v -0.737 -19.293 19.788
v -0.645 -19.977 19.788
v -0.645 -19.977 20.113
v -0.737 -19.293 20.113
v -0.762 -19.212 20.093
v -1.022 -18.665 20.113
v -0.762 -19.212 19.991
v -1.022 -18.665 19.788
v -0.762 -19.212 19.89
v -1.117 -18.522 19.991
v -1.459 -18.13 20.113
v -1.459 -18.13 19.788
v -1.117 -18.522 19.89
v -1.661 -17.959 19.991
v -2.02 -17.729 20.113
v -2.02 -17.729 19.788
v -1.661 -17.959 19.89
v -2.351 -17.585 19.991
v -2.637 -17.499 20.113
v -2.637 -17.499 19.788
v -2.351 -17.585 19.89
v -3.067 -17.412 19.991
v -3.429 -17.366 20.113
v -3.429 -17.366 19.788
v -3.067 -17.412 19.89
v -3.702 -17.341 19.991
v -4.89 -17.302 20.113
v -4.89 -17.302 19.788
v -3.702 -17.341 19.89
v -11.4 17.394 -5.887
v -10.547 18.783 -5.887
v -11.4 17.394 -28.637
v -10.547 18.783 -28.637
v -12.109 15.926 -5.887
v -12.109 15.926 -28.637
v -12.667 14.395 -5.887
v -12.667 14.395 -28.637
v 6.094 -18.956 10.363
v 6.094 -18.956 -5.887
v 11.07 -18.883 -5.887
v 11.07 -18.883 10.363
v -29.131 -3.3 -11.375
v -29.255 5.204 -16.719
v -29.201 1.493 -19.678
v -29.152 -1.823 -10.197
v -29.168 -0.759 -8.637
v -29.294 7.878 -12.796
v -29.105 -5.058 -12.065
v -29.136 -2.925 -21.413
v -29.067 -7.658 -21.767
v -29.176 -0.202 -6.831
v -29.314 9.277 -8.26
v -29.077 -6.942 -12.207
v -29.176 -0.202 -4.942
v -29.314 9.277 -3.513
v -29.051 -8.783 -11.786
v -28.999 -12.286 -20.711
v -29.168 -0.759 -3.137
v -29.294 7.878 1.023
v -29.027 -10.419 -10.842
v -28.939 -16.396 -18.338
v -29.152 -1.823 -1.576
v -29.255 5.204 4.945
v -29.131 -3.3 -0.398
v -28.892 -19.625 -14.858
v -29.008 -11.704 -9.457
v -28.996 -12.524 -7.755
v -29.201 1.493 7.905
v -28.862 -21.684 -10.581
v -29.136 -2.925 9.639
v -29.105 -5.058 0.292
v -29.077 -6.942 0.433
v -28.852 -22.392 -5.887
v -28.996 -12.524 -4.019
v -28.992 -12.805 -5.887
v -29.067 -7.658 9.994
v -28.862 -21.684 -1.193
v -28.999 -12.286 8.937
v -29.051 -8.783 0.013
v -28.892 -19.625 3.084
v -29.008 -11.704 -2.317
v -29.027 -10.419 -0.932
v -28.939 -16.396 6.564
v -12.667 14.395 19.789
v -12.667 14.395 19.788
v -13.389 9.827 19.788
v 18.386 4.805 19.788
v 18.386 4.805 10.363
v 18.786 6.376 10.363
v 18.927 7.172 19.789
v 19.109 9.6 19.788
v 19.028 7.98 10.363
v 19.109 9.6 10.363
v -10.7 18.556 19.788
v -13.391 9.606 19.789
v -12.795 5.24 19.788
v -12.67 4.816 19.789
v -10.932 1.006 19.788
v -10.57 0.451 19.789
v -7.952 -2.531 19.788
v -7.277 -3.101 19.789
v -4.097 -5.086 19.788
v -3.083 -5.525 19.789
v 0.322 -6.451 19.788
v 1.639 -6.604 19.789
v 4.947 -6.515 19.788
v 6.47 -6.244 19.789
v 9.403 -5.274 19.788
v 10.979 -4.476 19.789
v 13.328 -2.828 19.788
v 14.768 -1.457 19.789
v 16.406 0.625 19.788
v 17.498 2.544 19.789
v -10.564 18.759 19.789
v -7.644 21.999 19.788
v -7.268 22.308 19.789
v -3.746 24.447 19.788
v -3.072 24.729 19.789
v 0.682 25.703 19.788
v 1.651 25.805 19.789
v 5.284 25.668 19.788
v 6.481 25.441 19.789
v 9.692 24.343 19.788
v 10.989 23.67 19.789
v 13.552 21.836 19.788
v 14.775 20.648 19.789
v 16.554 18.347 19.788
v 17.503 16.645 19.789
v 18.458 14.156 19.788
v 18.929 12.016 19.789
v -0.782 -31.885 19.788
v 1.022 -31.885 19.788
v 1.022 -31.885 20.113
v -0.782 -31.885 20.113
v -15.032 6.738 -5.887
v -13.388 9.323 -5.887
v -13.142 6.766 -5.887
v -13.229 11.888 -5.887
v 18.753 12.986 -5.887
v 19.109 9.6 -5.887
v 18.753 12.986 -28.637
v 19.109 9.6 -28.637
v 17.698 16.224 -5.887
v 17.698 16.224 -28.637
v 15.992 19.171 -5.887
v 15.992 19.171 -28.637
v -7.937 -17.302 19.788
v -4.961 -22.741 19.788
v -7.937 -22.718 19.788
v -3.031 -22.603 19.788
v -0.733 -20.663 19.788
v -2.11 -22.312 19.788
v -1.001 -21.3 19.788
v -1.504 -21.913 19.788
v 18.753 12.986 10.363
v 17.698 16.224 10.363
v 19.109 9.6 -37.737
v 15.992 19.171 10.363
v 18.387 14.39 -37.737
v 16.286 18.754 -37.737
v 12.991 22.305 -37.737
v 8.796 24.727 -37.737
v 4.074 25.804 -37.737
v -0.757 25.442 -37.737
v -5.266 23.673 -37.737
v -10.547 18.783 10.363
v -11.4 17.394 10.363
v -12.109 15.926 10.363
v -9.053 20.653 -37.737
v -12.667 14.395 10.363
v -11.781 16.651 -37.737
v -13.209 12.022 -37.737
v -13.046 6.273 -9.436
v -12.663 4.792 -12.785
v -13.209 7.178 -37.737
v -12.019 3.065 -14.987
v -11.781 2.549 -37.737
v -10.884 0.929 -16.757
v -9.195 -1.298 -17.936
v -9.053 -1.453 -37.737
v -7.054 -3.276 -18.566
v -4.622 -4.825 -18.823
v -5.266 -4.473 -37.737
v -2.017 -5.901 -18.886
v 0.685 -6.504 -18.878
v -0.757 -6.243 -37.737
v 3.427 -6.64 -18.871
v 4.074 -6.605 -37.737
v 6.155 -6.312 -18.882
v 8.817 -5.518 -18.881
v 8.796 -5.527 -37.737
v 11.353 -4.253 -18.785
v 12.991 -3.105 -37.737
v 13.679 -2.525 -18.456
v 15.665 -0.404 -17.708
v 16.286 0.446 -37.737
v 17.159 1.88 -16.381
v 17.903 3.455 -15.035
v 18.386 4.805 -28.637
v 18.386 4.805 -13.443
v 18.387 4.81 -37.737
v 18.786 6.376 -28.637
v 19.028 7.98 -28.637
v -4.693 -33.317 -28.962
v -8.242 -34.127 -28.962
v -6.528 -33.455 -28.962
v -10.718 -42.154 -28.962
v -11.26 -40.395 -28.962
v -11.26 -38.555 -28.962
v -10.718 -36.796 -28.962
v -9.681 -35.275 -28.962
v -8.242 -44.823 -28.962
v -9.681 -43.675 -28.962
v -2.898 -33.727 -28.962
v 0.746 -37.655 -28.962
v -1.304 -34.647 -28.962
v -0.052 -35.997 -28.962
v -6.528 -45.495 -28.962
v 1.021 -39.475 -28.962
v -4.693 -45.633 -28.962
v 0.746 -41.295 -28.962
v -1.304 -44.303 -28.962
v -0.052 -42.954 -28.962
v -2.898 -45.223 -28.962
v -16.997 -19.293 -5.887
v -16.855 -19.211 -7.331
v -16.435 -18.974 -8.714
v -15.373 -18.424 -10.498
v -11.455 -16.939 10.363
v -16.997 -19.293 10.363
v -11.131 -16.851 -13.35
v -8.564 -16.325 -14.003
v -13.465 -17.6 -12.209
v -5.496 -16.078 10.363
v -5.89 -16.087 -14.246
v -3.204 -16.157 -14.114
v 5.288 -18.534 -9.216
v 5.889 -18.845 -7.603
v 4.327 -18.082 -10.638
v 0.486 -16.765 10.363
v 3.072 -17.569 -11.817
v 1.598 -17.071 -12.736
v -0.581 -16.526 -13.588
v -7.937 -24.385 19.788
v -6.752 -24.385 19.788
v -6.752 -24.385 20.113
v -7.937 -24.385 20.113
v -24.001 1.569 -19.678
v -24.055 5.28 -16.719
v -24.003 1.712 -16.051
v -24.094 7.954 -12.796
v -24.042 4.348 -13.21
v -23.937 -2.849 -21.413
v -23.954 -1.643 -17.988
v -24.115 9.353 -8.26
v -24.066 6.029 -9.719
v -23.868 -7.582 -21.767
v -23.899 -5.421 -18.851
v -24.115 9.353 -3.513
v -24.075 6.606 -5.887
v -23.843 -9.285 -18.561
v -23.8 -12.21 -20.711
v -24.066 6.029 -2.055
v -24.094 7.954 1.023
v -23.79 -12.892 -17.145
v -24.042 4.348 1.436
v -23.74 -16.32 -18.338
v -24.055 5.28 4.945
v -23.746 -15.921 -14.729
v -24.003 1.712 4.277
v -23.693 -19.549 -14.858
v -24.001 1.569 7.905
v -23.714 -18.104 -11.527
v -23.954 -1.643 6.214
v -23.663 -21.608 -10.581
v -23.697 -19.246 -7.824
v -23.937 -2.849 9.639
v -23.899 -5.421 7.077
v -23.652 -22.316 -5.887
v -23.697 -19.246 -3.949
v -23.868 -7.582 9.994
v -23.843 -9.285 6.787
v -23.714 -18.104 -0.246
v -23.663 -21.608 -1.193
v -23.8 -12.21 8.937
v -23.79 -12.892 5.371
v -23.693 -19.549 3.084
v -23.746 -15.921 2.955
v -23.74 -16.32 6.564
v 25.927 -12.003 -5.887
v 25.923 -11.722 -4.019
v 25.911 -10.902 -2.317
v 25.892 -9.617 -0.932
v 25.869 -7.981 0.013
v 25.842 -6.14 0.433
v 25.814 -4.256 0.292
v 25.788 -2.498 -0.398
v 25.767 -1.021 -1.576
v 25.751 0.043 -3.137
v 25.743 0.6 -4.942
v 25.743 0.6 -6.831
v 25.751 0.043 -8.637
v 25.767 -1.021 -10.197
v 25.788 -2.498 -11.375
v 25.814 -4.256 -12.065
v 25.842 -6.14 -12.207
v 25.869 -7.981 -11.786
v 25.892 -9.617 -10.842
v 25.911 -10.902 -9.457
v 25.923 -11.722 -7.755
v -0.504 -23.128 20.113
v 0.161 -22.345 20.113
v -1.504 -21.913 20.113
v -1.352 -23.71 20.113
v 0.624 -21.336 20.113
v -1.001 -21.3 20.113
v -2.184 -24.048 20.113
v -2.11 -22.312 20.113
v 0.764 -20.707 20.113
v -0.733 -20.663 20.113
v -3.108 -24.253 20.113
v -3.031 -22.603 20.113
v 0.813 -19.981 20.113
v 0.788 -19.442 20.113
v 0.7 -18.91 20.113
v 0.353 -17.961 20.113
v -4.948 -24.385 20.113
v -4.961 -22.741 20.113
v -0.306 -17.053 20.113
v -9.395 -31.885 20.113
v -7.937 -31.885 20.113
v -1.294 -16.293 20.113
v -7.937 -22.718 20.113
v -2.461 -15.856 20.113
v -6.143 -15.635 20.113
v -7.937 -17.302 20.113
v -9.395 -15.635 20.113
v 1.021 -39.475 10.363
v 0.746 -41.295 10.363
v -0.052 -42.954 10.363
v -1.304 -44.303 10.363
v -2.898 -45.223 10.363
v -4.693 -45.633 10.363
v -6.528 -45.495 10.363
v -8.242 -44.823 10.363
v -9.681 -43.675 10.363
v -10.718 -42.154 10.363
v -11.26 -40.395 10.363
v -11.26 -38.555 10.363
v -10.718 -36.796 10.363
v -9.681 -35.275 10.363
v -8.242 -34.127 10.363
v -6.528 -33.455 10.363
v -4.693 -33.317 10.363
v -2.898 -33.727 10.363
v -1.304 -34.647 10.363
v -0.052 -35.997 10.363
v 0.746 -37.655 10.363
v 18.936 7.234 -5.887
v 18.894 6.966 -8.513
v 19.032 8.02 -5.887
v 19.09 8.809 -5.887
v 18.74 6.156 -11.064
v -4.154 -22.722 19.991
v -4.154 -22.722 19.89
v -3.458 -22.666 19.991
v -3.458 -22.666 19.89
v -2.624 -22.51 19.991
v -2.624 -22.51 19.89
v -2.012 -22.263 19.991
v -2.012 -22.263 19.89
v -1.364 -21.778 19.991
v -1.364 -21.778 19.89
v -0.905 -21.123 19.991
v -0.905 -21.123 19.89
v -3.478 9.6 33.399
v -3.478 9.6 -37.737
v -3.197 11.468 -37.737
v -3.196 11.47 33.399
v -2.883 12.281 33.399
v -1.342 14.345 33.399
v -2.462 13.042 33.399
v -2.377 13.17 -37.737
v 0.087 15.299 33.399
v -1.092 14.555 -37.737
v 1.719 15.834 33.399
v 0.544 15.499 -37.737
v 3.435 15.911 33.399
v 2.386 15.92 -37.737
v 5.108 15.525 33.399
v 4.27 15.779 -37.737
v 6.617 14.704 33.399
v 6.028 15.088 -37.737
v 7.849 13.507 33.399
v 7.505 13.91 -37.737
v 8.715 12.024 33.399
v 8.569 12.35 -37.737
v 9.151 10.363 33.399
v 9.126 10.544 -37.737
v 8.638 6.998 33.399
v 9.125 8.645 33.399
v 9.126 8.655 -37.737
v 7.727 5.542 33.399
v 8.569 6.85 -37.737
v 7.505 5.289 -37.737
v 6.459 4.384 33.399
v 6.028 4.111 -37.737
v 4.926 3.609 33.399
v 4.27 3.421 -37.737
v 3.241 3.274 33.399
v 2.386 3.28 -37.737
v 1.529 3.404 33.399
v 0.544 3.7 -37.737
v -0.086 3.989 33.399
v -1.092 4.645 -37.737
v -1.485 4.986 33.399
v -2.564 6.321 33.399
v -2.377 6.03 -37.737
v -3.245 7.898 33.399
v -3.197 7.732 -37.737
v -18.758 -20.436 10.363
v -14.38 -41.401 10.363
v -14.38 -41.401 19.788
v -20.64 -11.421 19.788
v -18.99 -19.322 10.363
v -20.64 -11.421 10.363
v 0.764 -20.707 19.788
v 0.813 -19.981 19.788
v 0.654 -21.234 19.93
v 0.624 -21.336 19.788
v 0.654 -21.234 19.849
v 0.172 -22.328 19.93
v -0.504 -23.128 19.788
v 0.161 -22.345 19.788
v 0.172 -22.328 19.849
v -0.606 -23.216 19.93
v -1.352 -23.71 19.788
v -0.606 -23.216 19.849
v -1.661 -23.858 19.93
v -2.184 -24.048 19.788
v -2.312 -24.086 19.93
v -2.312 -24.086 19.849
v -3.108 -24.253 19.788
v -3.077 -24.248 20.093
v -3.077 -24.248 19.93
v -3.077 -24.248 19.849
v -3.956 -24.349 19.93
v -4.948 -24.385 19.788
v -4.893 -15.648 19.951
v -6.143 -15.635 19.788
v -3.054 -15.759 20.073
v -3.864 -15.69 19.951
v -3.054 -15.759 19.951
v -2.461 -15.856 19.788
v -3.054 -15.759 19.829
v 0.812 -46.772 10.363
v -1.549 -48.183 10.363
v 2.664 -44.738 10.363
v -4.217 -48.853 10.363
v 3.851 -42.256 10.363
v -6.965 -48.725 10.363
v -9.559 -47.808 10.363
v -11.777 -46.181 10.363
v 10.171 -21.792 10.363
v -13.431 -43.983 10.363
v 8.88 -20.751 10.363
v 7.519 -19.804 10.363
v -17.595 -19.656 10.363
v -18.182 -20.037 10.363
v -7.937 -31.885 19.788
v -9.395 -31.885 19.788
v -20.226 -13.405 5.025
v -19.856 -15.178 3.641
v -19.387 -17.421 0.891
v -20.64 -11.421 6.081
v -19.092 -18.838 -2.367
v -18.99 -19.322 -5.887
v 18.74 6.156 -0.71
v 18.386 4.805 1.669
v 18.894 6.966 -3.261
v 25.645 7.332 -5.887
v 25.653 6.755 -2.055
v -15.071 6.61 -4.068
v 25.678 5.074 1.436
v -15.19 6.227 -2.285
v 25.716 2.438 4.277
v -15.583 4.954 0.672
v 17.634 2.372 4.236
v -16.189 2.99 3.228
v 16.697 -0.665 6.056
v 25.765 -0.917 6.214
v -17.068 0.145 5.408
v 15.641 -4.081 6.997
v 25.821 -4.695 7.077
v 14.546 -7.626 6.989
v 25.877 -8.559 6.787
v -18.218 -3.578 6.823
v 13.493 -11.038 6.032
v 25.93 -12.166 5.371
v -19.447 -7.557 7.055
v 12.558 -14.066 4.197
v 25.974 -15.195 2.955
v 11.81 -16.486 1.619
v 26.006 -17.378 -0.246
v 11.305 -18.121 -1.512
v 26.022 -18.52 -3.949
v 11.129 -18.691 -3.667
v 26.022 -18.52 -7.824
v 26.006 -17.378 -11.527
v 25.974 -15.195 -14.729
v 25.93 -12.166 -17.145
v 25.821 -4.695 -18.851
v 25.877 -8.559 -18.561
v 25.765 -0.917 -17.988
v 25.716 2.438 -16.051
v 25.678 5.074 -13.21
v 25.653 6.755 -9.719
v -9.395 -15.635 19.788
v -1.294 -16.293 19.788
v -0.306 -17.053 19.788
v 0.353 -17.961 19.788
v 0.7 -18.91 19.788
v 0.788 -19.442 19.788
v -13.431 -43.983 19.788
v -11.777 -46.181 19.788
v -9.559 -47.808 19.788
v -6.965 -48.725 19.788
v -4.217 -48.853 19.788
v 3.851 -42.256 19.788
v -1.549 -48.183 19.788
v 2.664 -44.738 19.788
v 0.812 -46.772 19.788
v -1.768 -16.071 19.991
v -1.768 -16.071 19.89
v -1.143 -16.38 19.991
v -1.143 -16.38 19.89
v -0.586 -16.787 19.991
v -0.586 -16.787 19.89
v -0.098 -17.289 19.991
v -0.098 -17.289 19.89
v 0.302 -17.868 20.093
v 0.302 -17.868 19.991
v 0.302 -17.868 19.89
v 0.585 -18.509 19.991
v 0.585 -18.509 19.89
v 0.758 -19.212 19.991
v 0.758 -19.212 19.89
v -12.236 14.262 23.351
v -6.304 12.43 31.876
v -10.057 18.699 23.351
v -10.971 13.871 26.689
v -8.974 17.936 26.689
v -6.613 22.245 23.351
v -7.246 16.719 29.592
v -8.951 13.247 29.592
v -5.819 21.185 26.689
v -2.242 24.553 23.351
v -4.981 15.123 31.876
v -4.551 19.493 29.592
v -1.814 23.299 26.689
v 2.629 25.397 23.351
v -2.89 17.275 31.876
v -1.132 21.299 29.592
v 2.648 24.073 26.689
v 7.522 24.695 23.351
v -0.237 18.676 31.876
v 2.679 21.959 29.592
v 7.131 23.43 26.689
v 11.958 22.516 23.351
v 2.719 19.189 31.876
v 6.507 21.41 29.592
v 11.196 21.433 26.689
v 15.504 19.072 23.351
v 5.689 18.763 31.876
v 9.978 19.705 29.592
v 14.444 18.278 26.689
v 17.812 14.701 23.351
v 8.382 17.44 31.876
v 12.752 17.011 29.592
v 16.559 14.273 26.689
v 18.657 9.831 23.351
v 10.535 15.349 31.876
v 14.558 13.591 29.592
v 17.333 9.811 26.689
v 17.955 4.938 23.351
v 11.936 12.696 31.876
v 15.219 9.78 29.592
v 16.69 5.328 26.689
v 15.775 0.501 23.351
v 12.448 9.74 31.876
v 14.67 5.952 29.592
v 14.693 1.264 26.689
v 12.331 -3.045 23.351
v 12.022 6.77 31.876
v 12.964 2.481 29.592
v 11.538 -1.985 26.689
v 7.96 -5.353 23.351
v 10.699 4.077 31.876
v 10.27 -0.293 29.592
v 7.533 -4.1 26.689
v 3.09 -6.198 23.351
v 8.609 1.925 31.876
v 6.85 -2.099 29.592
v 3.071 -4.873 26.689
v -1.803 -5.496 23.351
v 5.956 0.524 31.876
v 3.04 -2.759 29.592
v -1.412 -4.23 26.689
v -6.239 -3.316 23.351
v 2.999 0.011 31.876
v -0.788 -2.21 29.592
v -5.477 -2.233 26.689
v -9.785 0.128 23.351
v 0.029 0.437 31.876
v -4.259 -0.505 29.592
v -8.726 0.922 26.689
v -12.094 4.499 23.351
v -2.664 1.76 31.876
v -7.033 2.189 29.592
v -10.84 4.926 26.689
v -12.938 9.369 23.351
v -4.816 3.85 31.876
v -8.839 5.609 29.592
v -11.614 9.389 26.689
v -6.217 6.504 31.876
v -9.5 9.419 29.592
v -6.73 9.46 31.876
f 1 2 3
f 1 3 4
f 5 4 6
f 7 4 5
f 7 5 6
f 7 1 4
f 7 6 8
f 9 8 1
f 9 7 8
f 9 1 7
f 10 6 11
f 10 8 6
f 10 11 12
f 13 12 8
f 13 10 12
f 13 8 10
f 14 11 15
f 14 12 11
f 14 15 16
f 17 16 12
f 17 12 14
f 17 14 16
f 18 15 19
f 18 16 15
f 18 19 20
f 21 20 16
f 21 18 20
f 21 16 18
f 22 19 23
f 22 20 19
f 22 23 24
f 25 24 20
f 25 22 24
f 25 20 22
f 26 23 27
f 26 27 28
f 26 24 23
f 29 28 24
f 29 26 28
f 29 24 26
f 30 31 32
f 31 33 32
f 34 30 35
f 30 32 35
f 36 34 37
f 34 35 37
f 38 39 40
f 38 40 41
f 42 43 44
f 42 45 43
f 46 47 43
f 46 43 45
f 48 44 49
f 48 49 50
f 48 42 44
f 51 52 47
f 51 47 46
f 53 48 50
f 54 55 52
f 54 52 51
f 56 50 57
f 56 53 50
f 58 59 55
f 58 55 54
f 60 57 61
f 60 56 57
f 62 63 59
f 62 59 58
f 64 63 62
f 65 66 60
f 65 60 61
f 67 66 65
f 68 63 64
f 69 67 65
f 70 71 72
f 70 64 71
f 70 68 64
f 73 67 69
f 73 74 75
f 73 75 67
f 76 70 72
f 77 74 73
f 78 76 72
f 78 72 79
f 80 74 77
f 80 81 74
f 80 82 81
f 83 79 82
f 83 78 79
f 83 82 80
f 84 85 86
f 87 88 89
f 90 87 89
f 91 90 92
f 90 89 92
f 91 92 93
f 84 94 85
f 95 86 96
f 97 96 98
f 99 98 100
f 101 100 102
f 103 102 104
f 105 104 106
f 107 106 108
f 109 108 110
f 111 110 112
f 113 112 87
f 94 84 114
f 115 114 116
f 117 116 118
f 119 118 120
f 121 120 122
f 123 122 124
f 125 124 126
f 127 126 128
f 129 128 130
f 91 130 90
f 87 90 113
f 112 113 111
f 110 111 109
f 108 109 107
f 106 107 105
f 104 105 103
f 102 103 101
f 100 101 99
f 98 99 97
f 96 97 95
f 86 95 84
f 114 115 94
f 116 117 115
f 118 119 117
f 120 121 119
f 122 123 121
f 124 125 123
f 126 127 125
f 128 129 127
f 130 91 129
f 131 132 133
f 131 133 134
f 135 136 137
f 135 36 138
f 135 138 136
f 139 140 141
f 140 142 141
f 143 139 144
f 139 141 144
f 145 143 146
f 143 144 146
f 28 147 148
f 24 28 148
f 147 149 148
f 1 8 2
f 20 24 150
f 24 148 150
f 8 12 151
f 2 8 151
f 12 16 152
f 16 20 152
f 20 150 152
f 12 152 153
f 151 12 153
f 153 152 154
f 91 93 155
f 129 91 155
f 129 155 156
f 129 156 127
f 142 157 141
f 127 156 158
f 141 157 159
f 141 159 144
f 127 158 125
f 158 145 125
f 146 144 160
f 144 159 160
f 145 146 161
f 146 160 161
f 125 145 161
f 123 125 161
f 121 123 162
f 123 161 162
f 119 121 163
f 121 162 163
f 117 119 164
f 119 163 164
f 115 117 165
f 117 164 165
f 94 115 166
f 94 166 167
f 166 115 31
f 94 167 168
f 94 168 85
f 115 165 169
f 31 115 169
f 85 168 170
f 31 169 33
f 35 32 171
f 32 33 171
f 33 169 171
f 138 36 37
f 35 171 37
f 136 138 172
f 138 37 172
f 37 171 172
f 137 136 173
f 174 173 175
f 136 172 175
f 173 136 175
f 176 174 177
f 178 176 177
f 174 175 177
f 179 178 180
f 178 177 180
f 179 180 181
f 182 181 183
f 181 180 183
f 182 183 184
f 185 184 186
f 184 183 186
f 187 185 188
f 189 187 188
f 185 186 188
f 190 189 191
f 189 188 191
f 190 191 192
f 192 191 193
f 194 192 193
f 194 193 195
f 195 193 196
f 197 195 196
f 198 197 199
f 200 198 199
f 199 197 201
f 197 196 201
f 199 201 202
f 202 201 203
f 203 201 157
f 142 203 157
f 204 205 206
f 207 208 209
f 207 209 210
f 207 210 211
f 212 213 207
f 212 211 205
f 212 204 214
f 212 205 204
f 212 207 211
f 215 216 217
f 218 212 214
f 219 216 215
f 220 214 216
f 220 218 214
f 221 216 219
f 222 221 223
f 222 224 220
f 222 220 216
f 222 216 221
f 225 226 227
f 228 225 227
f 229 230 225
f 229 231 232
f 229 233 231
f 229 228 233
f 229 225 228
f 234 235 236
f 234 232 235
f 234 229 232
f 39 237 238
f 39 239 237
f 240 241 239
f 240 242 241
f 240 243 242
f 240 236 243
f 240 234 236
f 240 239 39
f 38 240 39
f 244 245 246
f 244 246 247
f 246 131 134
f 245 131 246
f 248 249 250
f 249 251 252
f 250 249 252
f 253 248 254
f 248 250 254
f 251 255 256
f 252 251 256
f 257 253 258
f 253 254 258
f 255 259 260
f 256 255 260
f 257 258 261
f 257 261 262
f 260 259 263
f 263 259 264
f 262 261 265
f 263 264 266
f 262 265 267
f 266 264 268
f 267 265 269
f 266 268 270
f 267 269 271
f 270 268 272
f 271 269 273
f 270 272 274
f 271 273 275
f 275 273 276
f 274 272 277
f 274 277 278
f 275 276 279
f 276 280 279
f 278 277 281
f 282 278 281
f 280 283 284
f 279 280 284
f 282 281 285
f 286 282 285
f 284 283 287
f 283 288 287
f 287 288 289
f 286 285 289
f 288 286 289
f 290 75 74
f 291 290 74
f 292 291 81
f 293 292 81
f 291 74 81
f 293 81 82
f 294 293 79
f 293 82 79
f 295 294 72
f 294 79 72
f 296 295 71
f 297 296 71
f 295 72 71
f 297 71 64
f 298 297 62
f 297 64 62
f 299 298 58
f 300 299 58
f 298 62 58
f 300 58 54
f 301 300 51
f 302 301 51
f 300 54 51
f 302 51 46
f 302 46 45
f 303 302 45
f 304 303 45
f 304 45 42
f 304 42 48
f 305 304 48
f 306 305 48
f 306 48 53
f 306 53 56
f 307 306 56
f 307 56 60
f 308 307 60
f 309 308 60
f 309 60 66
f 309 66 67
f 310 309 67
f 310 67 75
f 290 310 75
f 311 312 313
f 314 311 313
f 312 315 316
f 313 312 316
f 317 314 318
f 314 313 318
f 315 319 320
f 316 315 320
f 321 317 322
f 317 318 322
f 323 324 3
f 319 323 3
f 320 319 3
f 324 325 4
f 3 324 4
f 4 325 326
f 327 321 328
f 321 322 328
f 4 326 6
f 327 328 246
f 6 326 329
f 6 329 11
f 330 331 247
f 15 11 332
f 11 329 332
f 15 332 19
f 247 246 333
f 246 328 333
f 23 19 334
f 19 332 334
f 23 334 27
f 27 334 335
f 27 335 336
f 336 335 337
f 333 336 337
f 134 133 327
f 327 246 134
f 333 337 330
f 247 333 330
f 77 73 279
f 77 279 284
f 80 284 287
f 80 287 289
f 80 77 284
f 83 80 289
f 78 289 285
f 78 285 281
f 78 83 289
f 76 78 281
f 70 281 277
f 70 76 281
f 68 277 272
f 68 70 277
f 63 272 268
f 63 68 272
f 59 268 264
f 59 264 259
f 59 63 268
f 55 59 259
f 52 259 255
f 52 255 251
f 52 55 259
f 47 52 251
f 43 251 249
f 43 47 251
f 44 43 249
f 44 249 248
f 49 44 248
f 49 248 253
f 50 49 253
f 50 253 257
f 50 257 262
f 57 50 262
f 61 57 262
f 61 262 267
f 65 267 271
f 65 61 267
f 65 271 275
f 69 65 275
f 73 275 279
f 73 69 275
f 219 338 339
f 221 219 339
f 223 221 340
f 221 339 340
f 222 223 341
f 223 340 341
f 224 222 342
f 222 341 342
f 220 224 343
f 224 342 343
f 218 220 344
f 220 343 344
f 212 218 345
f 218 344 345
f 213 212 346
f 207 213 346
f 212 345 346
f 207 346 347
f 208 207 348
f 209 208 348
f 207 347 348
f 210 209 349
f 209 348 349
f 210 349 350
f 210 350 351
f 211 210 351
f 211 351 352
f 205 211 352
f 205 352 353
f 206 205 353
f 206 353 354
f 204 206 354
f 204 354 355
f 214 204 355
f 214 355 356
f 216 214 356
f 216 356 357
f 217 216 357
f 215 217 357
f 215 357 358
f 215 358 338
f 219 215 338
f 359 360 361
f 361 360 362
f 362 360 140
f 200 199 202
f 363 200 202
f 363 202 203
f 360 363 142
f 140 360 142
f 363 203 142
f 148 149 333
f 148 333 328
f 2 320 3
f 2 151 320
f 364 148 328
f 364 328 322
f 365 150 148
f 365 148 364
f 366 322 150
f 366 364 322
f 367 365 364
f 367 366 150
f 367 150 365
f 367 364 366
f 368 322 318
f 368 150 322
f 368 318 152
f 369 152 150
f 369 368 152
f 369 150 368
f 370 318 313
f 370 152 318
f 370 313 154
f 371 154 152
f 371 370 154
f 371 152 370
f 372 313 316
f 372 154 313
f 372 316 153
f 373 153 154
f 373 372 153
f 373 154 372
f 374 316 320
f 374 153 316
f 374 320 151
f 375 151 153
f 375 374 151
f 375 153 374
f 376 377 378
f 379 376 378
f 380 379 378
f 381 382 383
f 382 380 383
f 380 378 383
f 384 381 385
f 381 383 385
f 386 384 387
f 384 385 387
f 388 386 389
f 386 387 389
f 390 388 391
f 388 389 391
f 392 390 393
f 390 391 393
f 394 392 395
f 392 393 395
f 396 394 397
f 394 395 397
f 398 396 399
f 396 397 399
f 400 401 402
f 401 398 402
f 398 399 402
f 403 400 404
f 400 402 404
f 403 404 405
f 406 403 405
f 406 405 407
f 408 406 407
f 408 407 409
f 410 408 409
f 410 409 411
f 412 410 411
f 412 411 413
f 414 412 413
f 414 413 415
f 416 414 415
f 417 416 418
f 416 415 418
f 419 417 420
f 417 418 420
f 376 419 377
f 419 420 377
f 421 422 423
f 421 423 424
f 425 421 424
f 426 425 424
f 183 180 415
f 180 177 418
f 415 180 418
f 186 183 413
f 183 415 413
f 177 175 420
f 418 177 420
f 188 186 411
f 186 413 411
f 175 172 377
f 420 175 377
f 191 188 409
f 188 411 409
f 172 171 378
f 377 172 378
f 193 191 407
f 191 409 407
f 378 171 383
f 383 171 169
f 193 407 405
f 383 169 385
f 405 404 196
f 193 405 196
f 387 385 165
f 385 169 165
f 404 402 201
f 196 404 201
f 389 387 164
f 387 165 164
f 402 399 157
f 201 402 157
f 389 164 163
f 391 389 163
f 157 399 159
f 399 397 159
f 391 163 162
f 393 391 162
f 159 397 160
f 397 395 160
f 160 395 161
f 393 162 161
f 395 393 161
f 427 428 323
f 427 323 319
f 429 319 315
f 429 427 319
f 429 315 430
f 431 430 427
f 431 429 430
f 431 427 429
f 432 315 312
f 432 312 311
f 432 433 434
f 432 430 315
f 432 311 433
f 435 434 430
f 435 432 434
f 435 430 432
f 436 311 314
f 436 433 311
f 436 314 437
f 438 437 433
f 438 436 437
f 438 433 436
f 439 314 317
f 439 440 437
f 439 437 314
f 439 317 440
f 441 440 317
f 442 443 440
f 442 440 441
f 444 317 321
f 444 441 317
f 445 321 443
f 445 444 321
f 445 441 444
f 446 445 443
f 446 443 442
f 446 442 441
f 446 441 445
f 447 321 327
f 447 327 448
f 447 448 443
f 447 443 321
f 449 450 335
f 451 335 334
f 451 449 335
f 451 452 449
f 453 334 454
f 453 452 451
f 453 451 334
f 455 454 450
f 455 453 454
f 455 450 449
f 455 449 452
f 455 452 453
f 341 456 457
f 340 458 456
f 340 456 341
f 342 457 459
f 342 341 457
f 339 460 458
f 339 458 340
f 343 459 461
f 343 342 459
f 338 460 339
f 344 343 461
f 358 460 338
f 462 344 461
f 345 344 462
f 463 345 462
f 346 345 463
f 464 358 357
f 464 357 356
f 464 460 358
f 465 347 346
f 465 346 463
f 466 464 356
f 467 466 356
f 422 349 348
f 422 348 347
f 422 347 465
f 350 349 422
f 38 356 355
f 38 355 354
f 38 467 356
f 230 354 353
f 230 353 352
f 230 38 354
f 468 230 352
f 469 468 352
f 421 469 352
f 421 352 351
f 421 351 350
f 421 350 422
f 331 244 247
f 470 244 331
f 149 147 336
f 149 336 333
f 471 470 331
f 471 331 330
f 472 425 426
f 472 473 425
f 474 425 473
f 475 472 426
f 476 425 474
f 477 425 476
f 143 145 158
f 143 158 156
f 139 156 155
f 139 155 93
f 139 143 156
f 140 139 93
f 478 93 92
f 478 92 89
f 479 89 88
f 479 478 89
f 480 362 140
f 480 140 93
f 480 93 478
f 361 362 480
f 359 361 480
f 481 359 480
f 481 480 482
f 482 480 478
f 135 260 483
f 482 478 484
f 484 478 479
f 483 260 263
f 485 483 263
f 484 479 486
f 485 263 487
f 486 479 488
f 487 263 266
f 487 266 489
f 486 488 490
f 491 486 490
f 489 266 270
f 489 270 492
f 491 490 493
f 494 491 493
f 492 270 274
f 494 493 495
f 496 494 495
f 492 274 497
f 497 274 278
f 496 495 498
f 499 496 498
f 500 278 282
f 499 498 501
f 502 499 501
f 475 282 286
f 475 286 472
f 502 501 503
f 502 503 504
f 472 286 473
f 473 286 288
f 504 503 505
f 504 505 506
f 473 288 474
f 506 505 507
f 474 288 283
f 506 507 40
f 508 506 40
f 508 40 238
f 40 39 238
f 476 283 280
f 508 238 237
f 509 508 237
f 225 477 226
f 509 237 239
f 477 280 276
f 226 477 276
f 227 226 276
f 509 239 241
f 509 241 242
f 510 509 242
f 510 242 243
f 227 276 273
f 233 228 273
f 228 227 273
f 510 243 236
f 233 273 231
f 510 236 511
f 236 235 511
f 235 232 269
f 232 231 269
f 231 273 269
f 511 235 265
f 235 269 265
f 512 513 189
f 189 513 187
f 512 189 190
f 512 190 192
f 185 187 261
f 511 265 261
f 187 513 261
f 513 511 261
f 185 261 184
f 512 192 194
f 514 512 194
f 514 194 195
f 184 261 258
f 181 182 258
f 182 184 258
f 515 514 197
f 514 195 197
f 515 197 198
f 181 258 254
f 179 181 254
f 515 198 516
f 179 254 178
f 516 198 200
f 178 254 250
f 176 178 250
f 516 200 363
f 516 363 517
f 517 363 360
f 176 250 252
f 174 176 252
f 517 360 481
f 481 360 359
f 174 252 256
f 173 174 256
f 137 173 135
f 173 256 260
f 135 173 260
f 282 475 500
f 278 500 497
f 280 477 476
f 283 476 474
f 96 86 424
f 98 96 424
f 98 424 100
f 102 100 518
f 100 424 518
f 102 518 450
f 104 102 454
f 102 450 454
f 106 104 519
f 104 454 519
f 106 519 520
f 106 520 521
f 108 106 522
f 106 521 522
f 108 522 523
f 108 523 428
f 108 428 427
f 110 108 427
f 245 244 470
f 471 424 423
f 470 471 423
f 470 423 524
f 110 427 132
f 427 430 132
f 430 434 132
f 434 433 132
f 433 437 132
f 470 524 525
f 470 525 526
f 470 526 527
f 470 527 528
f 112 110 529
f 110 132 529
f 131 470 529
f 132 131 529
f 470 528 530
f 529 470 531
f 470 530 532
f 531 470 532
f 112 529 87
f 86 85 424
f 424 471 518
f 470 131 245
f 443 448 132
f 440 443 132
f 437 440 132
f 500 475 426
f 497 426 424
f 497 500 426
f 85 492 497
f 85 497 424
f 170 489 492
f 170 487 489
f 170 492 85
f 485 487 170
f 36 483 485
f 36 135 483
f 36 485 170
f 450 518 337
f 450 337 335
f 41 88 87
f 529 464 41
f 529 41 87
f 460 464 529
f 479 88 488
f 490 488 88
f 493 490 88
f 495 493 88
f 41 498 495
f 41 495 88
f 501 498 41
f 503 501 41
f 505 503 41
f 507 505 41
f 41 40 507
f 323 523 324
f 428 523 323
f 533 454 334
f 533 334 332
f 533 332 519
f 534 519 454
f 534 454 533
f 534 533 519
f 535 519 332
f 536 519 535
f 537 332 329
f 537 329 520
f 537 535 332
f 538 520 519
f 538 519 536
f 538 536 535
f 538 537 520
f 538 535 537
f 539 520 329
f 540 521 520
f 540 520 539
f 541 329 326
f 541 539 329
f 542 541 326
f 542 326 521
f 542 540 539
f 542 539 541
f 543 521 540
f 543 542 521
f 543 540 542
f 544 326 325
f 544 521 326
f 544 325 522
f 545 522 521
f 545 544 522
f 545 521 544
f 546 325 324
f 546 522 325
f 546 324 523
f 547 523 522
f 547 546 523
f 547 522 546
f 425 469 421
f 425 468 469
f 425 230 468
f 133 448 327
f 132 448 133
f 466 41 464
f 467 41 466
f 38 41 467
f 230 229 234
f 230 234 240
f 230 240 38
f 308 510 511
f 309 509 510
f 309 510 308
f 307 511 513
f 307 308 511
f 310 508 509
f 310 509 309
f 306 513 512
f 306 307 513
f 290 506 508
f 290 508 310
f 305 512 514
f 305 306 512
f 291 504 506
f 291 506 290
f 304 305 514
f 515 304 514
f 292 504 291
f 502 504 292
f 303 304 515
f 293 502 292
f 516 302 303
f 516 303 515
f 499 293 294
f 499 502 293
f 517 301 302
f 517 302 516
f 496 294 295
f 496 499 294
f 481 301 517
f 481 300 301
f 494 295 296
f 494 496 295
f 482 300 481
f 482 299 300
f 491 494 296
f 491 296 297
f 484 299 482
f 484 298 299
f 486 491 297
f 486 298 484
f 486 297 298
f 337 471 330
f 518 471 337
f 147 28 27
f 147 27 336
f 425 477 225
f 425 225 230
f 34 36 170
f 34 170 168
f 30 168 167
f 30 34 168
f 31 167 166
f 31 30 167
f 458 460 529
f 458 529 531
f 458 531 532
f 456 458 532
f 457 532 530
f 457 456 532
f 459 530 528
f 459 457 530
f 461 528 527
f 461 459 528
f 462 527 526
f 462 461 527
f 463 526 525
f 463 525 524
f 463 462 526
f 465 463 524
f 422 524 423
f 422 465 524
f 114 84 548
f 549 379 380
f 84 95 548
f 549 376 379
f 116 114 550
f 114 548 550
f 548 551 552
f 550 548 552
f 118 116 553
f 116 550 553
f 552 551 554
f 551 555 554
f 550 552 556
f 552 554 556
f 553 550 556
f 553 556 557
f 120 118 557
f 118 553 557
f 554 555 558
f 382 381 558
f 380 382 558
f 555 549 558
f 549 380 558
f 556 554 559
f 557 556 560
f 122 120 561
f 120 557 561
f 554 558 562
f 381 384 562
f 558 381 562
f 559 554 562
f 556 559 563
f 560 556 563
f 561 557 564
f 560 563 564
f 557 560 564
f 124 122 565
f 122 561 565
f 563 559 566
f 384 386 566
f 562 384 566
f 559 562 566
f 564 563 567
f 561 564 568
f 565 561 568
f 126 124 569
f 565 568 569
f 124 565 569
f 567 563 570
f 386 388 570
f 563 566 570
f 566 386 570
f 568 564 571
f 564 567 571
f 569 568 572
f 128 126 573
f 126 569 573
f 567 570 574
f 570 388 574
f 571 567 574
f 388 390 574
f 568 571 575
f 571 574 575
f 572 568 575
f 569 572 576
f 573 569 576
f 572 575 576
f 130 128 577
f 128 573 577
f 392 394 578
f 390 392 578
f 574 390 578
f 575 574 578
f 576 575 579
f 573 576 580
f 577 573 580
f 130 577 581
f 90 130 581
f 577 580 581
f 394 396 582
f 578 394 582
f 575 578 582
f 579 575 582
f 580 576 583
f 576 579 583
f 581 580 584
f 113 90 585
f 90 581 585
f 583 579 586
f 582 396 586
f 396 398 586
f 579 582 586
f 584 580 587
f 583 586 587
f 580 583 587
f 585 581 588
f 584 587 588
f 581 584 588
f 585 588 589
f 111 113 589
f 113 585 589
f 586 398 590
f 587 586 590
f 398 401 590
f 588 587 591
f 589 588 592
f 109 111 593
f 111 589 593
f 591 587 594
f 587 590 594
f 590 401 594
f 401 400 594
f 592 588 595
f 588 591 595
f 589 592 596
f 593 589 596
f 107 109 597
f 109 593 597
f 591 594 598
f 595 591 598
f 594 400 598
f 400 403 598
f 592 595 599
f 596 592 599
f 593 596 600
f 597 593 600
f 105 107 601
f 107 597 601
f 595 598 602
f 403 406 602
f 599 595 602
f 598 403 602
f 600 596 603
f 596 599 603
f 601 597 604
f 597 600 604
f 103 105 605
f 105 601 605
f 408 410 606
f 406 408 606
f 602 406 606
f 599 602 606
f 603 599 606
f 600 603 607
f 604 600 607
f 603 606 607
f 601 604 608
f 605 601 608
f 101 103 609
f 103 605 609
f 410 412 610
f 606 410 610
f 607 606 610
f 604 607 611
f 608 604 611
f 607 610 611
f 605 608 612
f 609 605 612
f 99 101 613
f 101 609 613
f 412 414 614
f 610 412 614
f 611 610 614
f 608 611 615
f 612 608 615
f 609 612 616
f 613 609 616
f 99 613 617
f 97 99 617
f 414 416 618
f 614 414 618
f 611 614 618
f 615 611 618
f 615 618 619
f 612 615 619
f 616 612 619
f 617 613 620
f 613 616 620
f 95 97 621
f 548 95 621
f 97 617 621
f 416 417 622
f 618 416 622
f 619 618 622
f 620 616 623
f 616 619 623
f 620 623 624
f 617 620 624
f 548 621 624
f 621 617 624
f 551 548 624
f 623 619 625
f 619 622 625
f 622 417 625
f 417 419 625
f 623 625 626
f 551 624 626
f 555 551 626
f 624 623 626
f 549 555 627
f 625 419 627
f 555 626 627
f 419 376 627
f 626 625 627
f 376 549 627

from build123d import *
from build123d.topology import SkipClean

# Parameters (mm, degrees)
BOSS_EXTRU_1_DEPTH      = 1.45
ESQUISSE2_R             = 2.5
BOSS_EXTRU_2_DEPTH      = 2.2
BOSS_EXTRU_3_START      = -11.05
ESQUISSE3_R             = 2.5
BOSS_EXTRU_3_DEPTH      = 11.05
BOSS_EXTRU_4_START      = -1.45
ESQUISSE4_R             = 0.95
BOSS_EXTRU_4_DEPTH      = 7.5
CONG_1_R                = 2.2
BOSS_EXTRU_5_DEPTH      = 1
BOSS_EXTRU_5_DEPTH_BACK = 7.454
ENL_V_START             = -6
ENL_V_MAT_EXTRU_2_DEPTH = 6
BOSS_EXTRU_6_DEPTH      = 1
BOSS_EXTRU_6_DEPTH_BACK = 7.45
ESQUISSE8_R             = 2
ESQUISSE9_R             = 2.45
BOSS_EXTRU_7_DEPTH      = 0.8
ENL_V_START_2           = -6.05
ESQUISSE10_R            = 3.6
ESQUISSE10_R_2          = 0.95
ENL_V_MAT_EXTRU_3_DEPTH = 6.05
ESQUISSE11_R            = 0.975
ENL_V_MAT_EXTRU_4_DEPTH = 14.8
ESQUISSE12_R            = 0.975
ENL_V_MAT_EXTRU_5_DEPTH = 14.8
BOSS_EXTRU_8_DEPTH      = 0.05
SCALE1_SCALE            = 6.5


with BuildPart() as part:
    # Esquisse1 → Boss.-Extru.1 (new body)
    with BuildSketch(Plane.XY):
        with BuildLine():
            Line((2.388668556, -0.737741507), (0.152544962, -7.977890074))
            ThreePointArc((0.152544962, -7.977890074), (-1.300802178, -8.998408422), (-2.652272655, -7.846365386))
            Line((-2.652272655, -7.846365386), (-3.615331703, -3.23396357))
            Line((-3.615331703, -3.23396357), (-2.388668556, 0.737741507))
            ThreePointArc((-2.388668556, 0.737741507), (0.737741507, 2.388668556), (2.388668556, -0.737741507))
        make_face()
    extrude(amount=BOSS_EXTRU_1_DEPTH)

    # Esquisse2 → Boss.-Extru.2 (add)
    with BuildSketch(Plane.XY.offset(1.45)):
        with Locations(Location((0, 0, 0), (0, 0, 162.836669811))):
            Circle(ESQUISSE2_R)
    extrude(amount=BOSS_EXTRU_2_DEPTH)

    # Esquisse3 → Boss.-Extru.3 (add)
    with BuildSketch(Plane.XY.offset(3.65).offset(BOSS_EXTRU_3_START)):
        Circle(ESQUISSE3_R)
    extrude(amount=BOSS_EXTRU_3_DEPTH)

    # Esquisse4 → Boss.-Extru.4 (add)
    with BuildSketch(Plane(origin=(0, 0, 0), x_dir=(-1, 0, 0), z_dir=(0, 0, -1)).offset(BOSS_EXTRU_4_START)):
        with Locations(Location((1.232882801, -7.55, 0), (0, 0, 180))):
            Circle(ESQUISSE4_R)
    extrude(amount=BOSS_EXTRU_4_DEPTH)

    # Congé1
    cong_1_edges = [part.edges().sort_by_distance(p)[0] for p in [
        (2.388668556, -0.737741507, 3.65),
    ]]
    fillet(cong_1_edges, radius=CONG_1_R - 0.0001)  # a hair under: the kernel refuses the full size

    # Esquisse5 → Boss.-Extru.5 (add, two sides: drawn at the far end of the back side and taken through both)
    with SkipClean():  # the faces are left unmerged after this step: merging them gives an invalid solid
        with BuildSketch(Plane(origin=(2.499733458, 0.03650531, 0), x_dir=(0, 0, -1), z_dir=(0.9998933833040308, 0.014602123983129264, 0)).offset(-BOSS_EXTRU_5_DEPTH_BACK)):
            with BuildLine():
                Line((2.5, -4.4), (0, -4.4))
                Line((0, -4.4), (0, 1.44275903))
                Line((0, 1.44275903), (2.5, 1.44275903))
                Line((2.5, 1.44275903), (2.5, -0.4))
                ThreePointArc((2.5, -0.4), (4.5, -2.4), (2.5, -4.4))
            make_face()
        extrude(amount=BOSS_EXTRU_5_DEPTH + BOSS_EXTRU_5_DEPTH_BACK)
    add(part.part.scale(1), mode=Mode.REPLACE)  # the faces are merged on a copy

    # Esquisse7 → Enlèv. mat.-Extru.2 (cut)
    with SkipClean():  # the faces are left unmerged after this step: merging them gives an invalid solid
        with BuildSketch(Plane.XY.offset(ENL_V_START)):
            with BuildLine():
                Line((-2.062527014, 1.412792382), (-4.974539167, 1.370266286))
                Line((-4.974539167, 1.370266286), (-4.889222475, -4.471869809))
                Line((-4.889222475, -4.471869809), (-3.361517986, -4.4495597))
                Line((-3.361517986, -4.4495597), (-3.615331703, -3.23396357))
                Line((-3.615331703, -3.23396357), (-2.388668556, 0.737741507))
                ThreePointArc((-2.388668556, 0.737741507), (-2.251046184, 1.087561988), (-2.062527014, 1.412792382))
            make_face()
            with BuildLine():
                Line((1.263130408, -4.38202281), (3.563876187, -4.348423453))
                Line((3.563876187, -4.348423453), (3.478559495, 1.493712642))
                Line((3.478559495, 1.493712642), (2.020392322, 1.472418034))
                ThreePointArc((2.020392322, 1.472418034), (2.46599995, 0.410906614), (2.388668556, -0.737741507))
                Line((2.388668556, -0.737741507), (1.263130408, -4.38202281))
            make_face()
        extrude(amount=ENL_V_MAT_EXTRU_2_DEPTH, mode=Mode.SUBTRACT)
    add(part.part.scale(1), mode=Mode.REPLACE)  # the faces are merged on a copy

    # Esquisse8 → Boss.-Extru.6 (add, two sides: drawn at the far end of the back side and taken through both)
    with BuildSketch(Plane(origin=(2.499733458, 0.03650531, 0), x_dir=(0, 0, -1), z_dir=(0.9998933833040308, 0.014602123983129264, 0)).offset(-BOSS_EXTRU_6_DEPTH_BACK)):
        with Locations(Location((2.5, -2.4, 0), (0, 0, 90))):
            Circle(ESQUISSE8_R)
    extrude(amount=BOSS_EXTRU_6_DEPTH + BOSS_EXTRU_6_DEPTH_BACK)

    # Esquisse9 → Boss.-Extru.7 (add)
    with BuildSketch(Plane(origin=(-4.949472247, -0.072280514, 0), x_dir=(0, 0, 1), z_dir=(-0.9998933833040308, -0.014602123983129264, 0))):
        with Locations(Location((-2.5, -2.4, 0), (0, 0, 270))):
            Circle(ESQUISSE9_R)
    extrude(amount=-BOSS_EXTRU_7_DEPTH)

    # Esquisse10 → Enlèv. mat.-Extru.3 (cut)
    with BuildSketch(Plane(origin=(0, 0, -6.05), x_dir=(-1, 0, 0), z_dir=(0, 0, -1)).offset(ENL_V_START_2)):
        with Locations((1.232882801, -7.55)):
            Circle(ESQUISSE10_R)
        with Locations(Location((1.232882801, -7.55, 0), (0, 0, 180))):
            Circle(ESQUISSE10_R_2, mode=Mode.SUBTRACT)
    extrude(amount=ENL_V_MAT_EXTRU_3_DEPTH, mode=Mode.SUBTRACT)

    # Esquisse11 → Enlèv. mat.-Extru.4 (cut)
    with BuildSketch(Plane(origin=(0, 0, -7.4), x_dir=(-1, 0, 0), z_dir=(0, 0, -1))):
        Circle(ESQUISSE11_R)
    extrude(amount=-ENL_V_MAT_EXTRU_4_DEPTH, mode=Mode.SUBTRACT)

    # Esquisse12 → Enlèv. mat.-Extru.5 (cut)
    with BuildSketch(Plane(origin=(-4.949472247, -0.072280514, 0), x_dir=(0, 0, 1), z_dir=(-0.9998933833040308, -0.014602123983129264, 0))):
        with Locations(Location((-2.5, -2.4, 0), (0, 0, 270))):
            Circle(ESQUISSE12_R)
    extrude(amount=-ENL_V_MAT_EXTRU_5_DEPTH, mode=Mode.SUBTRACT)

    # Esquisse13 → Boss.-Extru.8 (add)
    with BuildSketch(Plane.XY.offset(1.45)):
        with BuildLine():
            Line((-1.885288931, -3.882291157), (-1.38498845, -3.882291157))
            add(Edge.make_bspline(
                [(-1.38498845, -3.882291157), (-1.35160193, -3.88240229), (-1.287496112, -3.882615677), (-1.195658062, -3.883805508), (-1.112210136, -3.887215762), (-1.037195965, -3.890150464), (-0.970616925, -3.895501851), (-0.912268861, -3.900616599), (-0.862420505, -3.907312071), (-0.832244897, -3.91353023), (-0.8185822, -3.916345644)],
                knots=[0, 0, 0, 0, 1.410062039, 2.707475311, 3.878576406, 4.937260626, 5.877586885, 6.699081471, 7.410979367, 8, 8, 8, 8], degree=3))
            add(Edge.make_bspline(
                [(-0.8185822, -3.916345644), (-0.800291754, -3.920864762), (-0.764101047, -3.929806594), (-0.711993857, -3.948706308), (-0.662340769, -3.970577469), (-0.615348037, -3.996265841), (-0.571251044, -4.025962112), (-0.529595107, -4.059153628), (-0.490191205, -4.095658775), (-0.454632898, -4.136397947), (-0.421105004, -4.179138311), (-0.392827413, -4.22535528), (-0.368451356, -4.273684943), (-0.349043844, -4.324618813), (-0.33341672, -4.377662936), (-0.322397978, -4.43329779), (-0.315789987, -4.491269915), (-0.315117233, -4.530811279), (-0.31477611, -4.550860869)],
                knots=[0, 0, 0, 0, 1.027469482, 2.033020251, 3.019912614, 3.986113645, 4.951240523, 5.91722682, 6.890402269, 7.87763091, 8.8651537, 9.85103654, 10.82876324, 11.815024772, 12.821070561, 13.842952187, 14.906261191, 16, 16, 16, 16], degree=3))
            add(Edge.make_bspline(
                [(-0.31477611, -4.550860869), (-0.315825395, -4.584171658), (-0.31787282, -4.649169635), (-0.33696218, -4.743498836), (-0.368231123, -4.831491203), (-0.411319186, -4.913035945), (-0.46619024, -4.986543548), (-0.53213652, -5.051108159), (-0.609194814, -5.105136668), (-0.680930039, -5.142602957), (-0.744297325, -5.166597892), (-0.796463977, -5.183481006), (-0.853368961, -5.196525267), (-0.914467057, -5.208211075), (-0.980012525, -5.217033714), (-1.049848267, -5.223495567), (-1.12402409, -5.227534173), (-1.174980568, -5.228135605), (-1.20119438, -5.228445003)],
                knots=[0, 0, 0, 0, 1.260483769, 2.459530307, 3.627416485, 4.787058657, 5.939039949, 7.08810263, 8.267026773, 9.491475466, 10.141966685, 10.831826277, 11.566392101, 12.351337768, 13.187381173, 14.07005841, 15.007169909, 16, 16, 16, 16], degree=3))
            Line((-1.20119438, -5.228445003), (-0.282724828, -6.382291157))
            Line((-0.282724828, -6.382291157), (-0.560168739, -6.382291157))
            Line((-0.560168739, -6.382291157), (-1.47863829, -5.228445003))
            Line((-1.47863829, -5.228445003), (-1.660929956, -5.228445003))
            Line((-1.660929956, -5.228445003), (-1.660929956, -6.382291157))
            Line((-1.660929956, -6.382291157), (-1.885288931, -6.382291157))
            Line((-1.885288931, -6.382291157), (-1.885288931, -3.882291157))
        make_face()
        with BuildLine():
            Line((-1.660929956, -4.138701413), (-1.660929956, -4.972034747))
            Line((-1.660929956, -4.972034747), (-1.203197585, -4.975540356))
            add(Edge.make_bspline(
                [(-1.203197585, -4.975540356), (-1.181826128, -4.975549811), (-1.140402159, -4.975568137), (-1.080473113, -4.972715439), (-1.024673033, -4.969470212), (-0.973215353, -4.964506394), (-0.926077085, -4.9581092), (-0.883281789, -4.950107068), (-0.84475961, -4.940784166), (-0.799832082, -4.926354433), (-0.749663131, -4.903492992), (-0.69514066, -4.870231921), (-0.648710419, -4.828396836), (-0.609483374, -4.780558653), (-0.577962352, -4.727961333), (-0.555739456, -4.671235355), (-0.541637711, -4.611812785), (-0.539974464, -4.570971279), (-0.539135085, -4.550360067)],
                knots=[0, 0, 0, 0, 1.146690395, 2.22261258, 3.21895312, 4.145990853, 4.996080663, 5.770904154, 6.481378293, 7.121626537, 8.300444488, 9.431385265, 10.535395872, 11.636531494, 12.74115979, 13.810798291, 14.895190096, 16, 16, 16, 16], degree=3))
            add(Edge.make_bspline(
                [(-0.539135085, -4.550360067), (-0.539993743, -4.530255372), (-0.541695289, -4.490415201), (-0.555587267, -4.432089551), (-0.579079682, -4.37704173), (-0.610738423, -4.325495669), (-0.649309248, -4.278705858), (-0.694536257, -4.238672177), (-0.745182825, -4.205636845), (-0.792519396, -4.184526573), (-0.834829547, -4.171583821), (-0.871565019, -4.162475847), (-0.913073217, -4.155158369), (-0.959555688, -4.149295468), (-1.010813995, -4.144256222), (-1.067107318, -4.140862095), (-1.128062161, -4.138852192), (-1.170309969, -4.138752843), (-1.192179956, -4.138701413)],
                knots=[0, 0, 0, 0, 1.101028733, 2.181837193, 3.264309656, 4.369019818, 5.486613113, 6.575447106, 7.666700264, 8.788928104, 9.402425223, 10.0903467, 10.862060571, 11.710948788, 12.657782767, 13.684531032, 14.801375019, 16, 16, 16, 16], degree=3))
            Line((-1.192179956, -4.138701413), (-1.660929956, -4.138701413))
        make_face(mode=Mode.SUBTRACT)
    extrude(amount=BOSS_EXTRU_8_DEPTH)


with BuildPart() as part_1:
    # Scale1: scaled about (-0.519885651, -1.745435598, -1.884204612)
    add(part.part.scale(SCALE1_SCALE).moved(Location((2.85937108, 9.599895789, 10.363125366))))


solid = part_1.part
